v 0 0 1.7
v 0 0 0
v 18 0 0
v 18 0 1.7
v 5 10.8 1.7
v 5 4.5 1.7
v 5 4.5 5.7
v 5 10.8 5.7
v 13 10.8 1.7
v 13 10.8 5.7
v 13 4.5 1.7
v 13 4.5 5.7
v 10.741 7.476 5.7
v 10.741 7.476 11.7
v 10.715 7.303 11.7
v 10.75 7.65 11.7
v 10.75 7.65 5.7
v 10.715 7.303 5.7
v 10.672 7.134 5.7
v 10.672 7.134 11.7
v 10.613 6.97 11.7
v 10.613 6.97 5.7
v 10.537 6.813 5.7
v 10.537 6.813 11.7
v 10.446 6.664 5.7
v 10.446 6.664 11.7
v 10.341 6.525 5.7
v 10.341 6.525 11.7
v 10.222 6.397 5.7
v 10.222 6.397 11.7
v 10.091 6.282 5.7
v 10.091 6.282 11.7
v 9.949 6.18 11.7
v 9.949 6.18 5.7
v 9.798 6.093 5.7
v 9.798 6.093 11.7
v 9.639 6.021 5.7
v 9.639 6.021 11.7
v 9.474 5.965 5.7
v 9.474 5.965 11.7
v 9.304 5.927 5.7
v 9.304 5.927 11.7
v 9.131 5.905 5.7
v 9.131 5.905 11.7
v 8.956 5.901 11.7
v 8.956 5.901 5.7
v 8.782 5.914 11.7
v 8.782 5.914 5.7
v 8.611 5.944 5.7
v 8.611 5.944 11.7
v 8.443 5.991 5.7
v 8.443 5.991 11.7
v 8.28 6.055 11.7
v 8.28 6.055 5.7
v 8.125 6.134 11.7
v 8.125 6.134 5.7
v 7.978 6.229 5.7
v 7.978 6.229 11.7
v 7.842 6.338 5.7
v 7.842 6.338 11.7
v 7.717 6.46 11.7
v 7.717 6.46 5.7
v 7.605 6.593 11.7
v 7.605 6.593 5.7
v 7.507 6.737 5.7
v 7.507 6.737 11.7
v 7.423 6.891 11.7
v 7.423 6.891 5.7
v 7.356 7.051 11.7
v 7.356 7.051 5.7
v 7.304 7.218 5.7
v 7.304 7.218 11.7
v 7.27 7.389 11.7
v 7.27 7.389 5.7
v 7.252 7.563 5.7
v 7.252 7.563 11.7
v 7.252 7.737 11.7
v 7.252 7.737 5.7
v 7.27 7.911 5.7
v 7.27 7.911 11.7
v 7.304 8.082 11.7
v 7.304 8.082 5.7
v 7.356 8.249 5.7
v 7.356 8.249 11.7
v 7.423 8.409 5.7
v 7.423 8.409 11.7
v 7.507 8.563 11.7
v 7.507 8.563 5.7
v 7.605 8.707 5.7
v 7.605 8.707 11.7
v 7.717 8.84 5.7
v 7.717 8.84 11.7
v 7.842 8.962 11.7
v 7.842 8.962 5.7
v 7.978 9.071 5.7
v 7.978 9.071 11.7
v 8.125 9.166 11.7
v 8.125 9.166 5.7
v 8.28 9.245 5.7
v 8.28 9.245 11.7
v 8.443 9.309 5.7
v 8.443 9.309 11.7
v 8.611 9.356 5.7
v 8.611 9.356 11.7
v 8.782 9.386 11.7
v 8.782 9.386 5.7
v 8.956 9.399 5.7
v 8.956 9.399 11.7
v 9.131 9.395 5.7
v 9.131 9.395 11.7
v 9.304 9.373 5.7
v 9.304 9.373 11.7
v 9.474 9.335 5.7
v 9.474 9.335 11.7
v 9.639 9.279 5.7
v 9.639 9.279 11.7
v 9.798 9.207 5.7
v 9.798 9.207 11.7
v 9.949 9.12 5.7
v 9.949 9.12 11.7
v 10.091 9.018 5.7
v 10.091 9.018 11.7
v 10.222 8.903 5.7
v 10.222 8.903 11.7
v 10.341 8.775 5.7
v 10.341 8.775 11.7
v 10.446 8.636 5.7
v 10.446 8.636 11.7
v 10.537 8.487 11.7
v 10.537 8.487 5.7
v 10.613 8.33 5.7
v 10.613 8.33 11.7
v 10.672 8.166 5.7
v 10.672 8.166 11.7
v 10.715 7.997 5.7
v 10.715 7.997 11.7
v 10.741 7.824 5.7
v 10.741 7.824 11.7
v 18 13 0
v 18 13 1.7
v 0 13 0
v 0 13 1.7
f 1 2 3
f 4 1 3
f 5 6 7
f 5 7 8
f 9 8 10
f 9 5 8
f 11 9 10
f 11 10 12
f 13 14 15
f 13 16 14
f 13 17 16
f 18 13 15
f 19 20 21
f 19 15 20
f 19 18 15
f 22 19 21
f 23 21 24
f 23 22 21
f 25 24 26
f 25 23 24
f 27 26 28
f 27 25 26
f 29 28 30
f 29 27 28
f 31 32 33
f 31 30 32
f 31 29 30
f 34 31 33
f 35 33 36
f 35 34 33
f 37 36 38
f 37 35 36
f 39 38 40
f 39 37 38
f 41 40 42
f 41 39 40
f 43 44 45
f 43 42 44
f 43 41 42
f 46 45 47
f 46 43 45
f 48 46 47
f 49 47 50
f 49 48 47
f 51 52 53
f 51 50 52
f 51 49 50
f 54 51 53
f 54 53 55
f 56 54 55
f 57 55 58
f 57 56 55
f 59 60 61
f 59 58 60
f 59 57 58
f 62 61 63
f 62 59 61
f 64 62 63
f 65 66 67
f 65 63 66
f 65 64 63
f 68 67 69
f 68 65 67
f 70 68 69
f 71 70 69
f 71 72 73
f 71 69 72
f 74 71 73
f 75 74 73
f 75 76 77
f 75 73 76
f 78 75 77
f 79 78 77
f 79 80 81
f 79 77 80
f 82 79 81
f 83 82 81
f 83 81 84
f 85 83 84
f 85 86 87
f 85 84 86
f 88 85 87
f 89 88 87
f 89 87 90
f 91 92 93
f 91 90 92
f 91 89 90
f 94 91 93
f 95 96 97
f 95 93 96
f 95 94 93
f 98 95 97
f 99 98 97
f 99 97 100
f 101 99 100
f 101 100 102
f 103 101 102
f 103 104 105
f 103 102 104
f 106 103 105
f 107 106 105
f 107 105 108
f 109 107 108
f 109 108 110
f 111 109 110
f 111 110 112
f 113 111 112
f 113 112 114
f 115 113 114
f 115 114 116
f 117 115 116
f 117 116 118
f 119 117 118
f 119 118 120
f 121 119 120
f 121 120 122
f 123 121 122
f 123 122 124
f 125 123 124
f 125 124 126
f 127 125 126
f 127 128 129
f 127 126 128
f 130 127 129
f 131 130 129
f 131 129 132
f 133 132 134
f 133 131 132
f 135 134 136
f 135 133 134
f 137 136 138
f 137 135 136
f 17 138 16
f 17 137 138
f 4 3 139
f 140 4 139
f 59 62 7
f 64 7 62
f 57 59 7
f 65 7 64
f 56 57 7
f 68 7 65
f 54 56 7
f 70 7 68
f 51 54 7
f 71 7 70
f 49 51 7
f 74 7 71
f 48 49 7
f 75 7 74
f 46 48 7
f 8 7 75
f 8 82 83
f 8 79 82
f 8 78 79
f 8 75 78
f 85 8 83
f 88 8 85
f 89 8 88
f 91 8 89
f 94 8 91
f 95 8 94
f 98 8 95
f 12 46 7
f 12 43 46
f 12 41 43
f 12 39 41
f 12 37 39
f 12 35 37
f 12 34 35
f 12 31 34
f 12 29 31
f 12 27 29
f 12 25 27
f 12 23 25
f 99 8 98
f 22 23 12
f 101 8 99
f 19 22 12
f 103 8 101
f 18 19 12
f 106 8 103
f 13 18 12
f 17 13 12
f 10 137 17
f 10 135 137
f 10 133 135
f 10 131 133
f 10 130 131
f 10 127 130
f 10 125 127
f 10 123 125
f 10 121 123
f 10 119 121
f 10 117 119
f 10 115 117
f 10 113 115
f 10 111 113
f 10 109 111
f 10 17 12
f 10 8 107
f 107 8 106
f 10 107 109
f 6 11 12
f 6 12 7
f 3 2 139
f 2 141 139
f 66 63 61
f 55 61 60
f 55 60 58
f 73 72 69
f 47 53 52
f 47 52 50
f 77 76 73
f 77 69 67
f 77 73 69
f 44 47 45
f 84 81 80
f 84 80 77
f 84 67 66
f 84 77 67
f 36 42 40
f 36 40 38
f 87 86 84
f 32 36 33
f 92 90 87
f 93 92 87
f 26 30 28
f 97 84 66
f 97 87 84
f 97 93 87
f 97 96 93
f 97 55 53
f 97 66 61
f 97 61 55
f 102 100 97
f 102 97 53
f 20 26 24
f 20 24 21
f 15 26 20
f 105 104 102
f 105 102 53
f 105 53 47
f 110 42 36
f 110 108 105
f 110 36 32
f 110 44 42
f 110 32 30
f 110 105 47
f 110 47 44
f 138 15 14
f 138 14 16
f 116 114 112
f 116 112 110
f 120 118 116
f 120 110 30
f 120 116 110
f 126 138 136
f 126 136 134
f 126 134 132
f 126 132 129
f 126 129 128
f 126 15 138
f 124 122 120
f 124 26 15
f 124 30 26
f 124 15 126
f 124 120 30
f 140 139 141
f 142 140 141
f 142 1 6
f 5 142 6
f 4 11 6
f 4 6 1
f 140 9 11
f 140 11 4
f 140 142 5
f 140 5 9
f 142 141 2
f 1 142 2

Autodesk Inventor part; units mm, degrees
ref_plane "YZ Plane" through (0, 0, 0) normal (1, 0, 0) x (0, 1, 0)
ref_plane "XZ Plane" through (0, 0, 0) normal (0, 1, 0) x (-1, 0, 0)
ref_plane "XY Plane" through (0, 0, 0) normal (0, 0, 1) x (1, 0, 0)
sketch "Sketch1" plane through (0, 0, 0) normal (0, 0, 1) x (1, 0, 0)
  line L0 (0, 0) -> (18, 0)
  line L1 (18, 0) -> (18, 13)
  line L2 (18, 13) -> (0, 13)
  line L3 (0, 13) -> (0, 0)
  dimension "d0" = 18
  dimension "d1" = 13
extrude "Extrusion1" add sketch "Sketch1" along normal blind 1.7
sketch "Sketch2" plane through (0, 0, 1.7) normal (0, 0, 1) x (1, 0, 0)
  line L0 (5, 10.8) -> (13, 10.8)
  line L1 (13, 10.8) -> (13, 4.5)
  line L2 (13, 4.5) -> (5, 4.5)
  line L3 (5, 4.5) -> (5, 10.8)
  line L4 (0, 13) -> (0, 0) projected
  line L5 (18, 13) -> (0, 13) projected
  dimension "d4" = 8
  dimension "d5" = 6.3
  dimension "d6" = 5
  dimension "d7" = 2.2
extrude "Extrusion2" add sketch "Sketch2" along normal blind 4
sketch "Sketch3" plane through (0, 0, 5.7) normal (0, 0, 1) x (1, 0, 0)
  circle A0 centre (9, 7.65) radius 1.75
  line L0 (5, 10.8) -> (5, 4.5) projected
  line L1 (13, 10.8) -> (5, 10.8) projected
  point P0 (0, 0)
  dimension "d10" = 3.5
  dimension "d11" = 4
  dimension "d12" = 3.15
extrude "Extrusion3" add sketch "Sketch3" along normal blind 6
properties part number "Switch"
